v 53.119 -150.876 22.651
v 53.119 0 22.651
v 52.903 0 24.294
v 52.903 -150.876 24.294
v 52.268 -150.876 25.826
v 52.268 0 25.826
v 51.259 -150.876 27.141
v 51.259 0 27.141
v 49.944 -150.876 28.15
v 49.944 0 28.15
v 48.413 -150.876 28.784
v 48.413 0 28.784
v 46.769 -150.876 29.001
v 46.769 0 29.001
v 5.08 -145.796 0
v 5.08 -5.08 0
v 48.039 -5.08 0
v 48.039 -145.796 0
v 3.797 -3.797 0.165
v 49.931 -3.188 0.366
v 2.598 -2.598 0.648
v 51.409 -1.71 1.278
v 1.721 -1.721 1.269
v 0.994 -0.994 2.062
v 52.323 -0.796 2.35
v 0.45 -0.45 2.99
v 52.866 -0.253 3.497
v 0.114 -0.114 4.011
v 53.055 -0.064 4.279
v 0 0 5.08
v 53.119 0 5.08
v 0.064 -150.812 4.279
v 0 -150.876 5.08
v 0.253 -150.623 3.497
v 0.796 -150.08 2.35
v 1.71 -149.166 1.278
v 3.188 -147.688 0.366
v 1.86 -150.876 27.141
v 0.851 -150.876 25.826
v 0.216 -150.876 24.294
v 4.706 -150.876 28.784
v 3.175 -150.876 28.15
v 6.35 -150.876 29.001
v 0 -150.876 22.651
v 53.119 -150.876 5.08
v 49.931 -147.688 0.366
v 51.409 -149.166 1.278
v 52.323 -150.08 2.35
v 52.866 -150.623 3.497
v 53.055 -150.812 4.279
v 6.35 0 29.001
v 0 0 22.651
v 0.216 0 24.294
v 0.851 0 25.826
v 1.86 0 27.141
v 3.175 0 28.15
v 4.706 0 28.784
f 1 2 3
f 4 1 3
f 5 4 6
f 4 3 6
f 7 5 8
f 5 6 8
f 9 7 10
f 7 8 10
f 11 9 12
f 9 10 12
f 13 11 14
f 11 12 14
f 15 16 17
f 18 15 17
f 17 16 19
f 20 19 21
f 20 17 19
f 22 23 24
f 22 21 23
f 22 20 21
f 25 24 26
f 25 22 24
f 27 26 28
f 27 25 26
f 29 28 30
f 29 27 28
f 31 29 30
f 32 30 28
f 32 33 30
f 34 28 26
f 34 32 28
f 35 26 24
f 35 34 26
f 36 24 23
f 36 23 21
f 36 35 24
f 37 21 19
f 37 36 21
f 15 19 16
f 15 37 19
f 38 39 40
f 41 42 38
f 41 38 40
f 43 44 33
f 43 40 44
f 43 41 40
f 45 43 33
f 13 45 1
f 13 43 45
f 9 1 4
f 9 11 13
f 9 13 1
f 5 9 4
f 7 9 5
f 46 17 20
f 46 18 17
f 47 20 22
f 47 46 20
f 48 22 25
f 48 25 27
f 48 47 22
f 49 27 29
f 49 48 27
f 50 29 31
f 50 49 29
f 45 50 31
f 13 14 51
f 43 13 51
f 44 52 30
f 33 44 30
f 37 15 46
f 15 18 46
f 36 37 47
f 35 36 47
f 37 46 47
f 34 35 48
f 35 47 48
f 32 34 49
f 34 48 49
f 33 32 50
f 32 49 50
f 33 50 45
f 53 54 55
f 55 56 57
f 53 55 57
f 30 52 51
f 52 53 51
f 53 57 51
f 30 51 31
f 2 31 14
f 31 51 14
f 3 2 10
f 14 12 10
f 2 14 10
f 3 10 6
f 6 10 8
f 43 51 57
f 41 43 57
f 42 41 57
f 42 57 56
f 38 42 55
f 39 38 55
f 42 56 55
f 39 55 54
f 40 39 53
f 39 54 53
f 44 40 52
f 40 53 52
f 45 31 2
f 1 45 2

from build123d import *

# Parameters (mm, degrees)
F1_DEPTH = 150.876
F2_R     = 5.08


with BuildPart() as f1:
    # F0 (on Front) → F1 (new body)
    with BuildSketch(Plane.XZ):
        with BuildLine():
            Line((0, 22.650681), (0, 0))
            Line((0, 0), (53.119011, 0))
            Line((53.119011, 0), (53.119011, 22.650681))
            ThreePointArc((53.119011, 22.650681), (51.259139, 27.140809), (46.769011, 29.000681))
            Line((46.769011, 29.000681), (6.35, 29.000681))
            ThreePointArc((6.35, 29.000681), (1.859872, 27.140809), (0, 22.650681))
        make_face()
    extrude(amount=F1_DEPTH)

    # F2
    f2_edges = [f1.edges().sort_by_distance(p)[0] for p in [
        (53.119011, -75.438, 0),
        (26.559506, -150.876, 0),
        (0, -75.438, 0),
        (26.559506, 0, 0),
    ]]
    fillet(f2_edges, radius=F2_R)


solid = f1.part
